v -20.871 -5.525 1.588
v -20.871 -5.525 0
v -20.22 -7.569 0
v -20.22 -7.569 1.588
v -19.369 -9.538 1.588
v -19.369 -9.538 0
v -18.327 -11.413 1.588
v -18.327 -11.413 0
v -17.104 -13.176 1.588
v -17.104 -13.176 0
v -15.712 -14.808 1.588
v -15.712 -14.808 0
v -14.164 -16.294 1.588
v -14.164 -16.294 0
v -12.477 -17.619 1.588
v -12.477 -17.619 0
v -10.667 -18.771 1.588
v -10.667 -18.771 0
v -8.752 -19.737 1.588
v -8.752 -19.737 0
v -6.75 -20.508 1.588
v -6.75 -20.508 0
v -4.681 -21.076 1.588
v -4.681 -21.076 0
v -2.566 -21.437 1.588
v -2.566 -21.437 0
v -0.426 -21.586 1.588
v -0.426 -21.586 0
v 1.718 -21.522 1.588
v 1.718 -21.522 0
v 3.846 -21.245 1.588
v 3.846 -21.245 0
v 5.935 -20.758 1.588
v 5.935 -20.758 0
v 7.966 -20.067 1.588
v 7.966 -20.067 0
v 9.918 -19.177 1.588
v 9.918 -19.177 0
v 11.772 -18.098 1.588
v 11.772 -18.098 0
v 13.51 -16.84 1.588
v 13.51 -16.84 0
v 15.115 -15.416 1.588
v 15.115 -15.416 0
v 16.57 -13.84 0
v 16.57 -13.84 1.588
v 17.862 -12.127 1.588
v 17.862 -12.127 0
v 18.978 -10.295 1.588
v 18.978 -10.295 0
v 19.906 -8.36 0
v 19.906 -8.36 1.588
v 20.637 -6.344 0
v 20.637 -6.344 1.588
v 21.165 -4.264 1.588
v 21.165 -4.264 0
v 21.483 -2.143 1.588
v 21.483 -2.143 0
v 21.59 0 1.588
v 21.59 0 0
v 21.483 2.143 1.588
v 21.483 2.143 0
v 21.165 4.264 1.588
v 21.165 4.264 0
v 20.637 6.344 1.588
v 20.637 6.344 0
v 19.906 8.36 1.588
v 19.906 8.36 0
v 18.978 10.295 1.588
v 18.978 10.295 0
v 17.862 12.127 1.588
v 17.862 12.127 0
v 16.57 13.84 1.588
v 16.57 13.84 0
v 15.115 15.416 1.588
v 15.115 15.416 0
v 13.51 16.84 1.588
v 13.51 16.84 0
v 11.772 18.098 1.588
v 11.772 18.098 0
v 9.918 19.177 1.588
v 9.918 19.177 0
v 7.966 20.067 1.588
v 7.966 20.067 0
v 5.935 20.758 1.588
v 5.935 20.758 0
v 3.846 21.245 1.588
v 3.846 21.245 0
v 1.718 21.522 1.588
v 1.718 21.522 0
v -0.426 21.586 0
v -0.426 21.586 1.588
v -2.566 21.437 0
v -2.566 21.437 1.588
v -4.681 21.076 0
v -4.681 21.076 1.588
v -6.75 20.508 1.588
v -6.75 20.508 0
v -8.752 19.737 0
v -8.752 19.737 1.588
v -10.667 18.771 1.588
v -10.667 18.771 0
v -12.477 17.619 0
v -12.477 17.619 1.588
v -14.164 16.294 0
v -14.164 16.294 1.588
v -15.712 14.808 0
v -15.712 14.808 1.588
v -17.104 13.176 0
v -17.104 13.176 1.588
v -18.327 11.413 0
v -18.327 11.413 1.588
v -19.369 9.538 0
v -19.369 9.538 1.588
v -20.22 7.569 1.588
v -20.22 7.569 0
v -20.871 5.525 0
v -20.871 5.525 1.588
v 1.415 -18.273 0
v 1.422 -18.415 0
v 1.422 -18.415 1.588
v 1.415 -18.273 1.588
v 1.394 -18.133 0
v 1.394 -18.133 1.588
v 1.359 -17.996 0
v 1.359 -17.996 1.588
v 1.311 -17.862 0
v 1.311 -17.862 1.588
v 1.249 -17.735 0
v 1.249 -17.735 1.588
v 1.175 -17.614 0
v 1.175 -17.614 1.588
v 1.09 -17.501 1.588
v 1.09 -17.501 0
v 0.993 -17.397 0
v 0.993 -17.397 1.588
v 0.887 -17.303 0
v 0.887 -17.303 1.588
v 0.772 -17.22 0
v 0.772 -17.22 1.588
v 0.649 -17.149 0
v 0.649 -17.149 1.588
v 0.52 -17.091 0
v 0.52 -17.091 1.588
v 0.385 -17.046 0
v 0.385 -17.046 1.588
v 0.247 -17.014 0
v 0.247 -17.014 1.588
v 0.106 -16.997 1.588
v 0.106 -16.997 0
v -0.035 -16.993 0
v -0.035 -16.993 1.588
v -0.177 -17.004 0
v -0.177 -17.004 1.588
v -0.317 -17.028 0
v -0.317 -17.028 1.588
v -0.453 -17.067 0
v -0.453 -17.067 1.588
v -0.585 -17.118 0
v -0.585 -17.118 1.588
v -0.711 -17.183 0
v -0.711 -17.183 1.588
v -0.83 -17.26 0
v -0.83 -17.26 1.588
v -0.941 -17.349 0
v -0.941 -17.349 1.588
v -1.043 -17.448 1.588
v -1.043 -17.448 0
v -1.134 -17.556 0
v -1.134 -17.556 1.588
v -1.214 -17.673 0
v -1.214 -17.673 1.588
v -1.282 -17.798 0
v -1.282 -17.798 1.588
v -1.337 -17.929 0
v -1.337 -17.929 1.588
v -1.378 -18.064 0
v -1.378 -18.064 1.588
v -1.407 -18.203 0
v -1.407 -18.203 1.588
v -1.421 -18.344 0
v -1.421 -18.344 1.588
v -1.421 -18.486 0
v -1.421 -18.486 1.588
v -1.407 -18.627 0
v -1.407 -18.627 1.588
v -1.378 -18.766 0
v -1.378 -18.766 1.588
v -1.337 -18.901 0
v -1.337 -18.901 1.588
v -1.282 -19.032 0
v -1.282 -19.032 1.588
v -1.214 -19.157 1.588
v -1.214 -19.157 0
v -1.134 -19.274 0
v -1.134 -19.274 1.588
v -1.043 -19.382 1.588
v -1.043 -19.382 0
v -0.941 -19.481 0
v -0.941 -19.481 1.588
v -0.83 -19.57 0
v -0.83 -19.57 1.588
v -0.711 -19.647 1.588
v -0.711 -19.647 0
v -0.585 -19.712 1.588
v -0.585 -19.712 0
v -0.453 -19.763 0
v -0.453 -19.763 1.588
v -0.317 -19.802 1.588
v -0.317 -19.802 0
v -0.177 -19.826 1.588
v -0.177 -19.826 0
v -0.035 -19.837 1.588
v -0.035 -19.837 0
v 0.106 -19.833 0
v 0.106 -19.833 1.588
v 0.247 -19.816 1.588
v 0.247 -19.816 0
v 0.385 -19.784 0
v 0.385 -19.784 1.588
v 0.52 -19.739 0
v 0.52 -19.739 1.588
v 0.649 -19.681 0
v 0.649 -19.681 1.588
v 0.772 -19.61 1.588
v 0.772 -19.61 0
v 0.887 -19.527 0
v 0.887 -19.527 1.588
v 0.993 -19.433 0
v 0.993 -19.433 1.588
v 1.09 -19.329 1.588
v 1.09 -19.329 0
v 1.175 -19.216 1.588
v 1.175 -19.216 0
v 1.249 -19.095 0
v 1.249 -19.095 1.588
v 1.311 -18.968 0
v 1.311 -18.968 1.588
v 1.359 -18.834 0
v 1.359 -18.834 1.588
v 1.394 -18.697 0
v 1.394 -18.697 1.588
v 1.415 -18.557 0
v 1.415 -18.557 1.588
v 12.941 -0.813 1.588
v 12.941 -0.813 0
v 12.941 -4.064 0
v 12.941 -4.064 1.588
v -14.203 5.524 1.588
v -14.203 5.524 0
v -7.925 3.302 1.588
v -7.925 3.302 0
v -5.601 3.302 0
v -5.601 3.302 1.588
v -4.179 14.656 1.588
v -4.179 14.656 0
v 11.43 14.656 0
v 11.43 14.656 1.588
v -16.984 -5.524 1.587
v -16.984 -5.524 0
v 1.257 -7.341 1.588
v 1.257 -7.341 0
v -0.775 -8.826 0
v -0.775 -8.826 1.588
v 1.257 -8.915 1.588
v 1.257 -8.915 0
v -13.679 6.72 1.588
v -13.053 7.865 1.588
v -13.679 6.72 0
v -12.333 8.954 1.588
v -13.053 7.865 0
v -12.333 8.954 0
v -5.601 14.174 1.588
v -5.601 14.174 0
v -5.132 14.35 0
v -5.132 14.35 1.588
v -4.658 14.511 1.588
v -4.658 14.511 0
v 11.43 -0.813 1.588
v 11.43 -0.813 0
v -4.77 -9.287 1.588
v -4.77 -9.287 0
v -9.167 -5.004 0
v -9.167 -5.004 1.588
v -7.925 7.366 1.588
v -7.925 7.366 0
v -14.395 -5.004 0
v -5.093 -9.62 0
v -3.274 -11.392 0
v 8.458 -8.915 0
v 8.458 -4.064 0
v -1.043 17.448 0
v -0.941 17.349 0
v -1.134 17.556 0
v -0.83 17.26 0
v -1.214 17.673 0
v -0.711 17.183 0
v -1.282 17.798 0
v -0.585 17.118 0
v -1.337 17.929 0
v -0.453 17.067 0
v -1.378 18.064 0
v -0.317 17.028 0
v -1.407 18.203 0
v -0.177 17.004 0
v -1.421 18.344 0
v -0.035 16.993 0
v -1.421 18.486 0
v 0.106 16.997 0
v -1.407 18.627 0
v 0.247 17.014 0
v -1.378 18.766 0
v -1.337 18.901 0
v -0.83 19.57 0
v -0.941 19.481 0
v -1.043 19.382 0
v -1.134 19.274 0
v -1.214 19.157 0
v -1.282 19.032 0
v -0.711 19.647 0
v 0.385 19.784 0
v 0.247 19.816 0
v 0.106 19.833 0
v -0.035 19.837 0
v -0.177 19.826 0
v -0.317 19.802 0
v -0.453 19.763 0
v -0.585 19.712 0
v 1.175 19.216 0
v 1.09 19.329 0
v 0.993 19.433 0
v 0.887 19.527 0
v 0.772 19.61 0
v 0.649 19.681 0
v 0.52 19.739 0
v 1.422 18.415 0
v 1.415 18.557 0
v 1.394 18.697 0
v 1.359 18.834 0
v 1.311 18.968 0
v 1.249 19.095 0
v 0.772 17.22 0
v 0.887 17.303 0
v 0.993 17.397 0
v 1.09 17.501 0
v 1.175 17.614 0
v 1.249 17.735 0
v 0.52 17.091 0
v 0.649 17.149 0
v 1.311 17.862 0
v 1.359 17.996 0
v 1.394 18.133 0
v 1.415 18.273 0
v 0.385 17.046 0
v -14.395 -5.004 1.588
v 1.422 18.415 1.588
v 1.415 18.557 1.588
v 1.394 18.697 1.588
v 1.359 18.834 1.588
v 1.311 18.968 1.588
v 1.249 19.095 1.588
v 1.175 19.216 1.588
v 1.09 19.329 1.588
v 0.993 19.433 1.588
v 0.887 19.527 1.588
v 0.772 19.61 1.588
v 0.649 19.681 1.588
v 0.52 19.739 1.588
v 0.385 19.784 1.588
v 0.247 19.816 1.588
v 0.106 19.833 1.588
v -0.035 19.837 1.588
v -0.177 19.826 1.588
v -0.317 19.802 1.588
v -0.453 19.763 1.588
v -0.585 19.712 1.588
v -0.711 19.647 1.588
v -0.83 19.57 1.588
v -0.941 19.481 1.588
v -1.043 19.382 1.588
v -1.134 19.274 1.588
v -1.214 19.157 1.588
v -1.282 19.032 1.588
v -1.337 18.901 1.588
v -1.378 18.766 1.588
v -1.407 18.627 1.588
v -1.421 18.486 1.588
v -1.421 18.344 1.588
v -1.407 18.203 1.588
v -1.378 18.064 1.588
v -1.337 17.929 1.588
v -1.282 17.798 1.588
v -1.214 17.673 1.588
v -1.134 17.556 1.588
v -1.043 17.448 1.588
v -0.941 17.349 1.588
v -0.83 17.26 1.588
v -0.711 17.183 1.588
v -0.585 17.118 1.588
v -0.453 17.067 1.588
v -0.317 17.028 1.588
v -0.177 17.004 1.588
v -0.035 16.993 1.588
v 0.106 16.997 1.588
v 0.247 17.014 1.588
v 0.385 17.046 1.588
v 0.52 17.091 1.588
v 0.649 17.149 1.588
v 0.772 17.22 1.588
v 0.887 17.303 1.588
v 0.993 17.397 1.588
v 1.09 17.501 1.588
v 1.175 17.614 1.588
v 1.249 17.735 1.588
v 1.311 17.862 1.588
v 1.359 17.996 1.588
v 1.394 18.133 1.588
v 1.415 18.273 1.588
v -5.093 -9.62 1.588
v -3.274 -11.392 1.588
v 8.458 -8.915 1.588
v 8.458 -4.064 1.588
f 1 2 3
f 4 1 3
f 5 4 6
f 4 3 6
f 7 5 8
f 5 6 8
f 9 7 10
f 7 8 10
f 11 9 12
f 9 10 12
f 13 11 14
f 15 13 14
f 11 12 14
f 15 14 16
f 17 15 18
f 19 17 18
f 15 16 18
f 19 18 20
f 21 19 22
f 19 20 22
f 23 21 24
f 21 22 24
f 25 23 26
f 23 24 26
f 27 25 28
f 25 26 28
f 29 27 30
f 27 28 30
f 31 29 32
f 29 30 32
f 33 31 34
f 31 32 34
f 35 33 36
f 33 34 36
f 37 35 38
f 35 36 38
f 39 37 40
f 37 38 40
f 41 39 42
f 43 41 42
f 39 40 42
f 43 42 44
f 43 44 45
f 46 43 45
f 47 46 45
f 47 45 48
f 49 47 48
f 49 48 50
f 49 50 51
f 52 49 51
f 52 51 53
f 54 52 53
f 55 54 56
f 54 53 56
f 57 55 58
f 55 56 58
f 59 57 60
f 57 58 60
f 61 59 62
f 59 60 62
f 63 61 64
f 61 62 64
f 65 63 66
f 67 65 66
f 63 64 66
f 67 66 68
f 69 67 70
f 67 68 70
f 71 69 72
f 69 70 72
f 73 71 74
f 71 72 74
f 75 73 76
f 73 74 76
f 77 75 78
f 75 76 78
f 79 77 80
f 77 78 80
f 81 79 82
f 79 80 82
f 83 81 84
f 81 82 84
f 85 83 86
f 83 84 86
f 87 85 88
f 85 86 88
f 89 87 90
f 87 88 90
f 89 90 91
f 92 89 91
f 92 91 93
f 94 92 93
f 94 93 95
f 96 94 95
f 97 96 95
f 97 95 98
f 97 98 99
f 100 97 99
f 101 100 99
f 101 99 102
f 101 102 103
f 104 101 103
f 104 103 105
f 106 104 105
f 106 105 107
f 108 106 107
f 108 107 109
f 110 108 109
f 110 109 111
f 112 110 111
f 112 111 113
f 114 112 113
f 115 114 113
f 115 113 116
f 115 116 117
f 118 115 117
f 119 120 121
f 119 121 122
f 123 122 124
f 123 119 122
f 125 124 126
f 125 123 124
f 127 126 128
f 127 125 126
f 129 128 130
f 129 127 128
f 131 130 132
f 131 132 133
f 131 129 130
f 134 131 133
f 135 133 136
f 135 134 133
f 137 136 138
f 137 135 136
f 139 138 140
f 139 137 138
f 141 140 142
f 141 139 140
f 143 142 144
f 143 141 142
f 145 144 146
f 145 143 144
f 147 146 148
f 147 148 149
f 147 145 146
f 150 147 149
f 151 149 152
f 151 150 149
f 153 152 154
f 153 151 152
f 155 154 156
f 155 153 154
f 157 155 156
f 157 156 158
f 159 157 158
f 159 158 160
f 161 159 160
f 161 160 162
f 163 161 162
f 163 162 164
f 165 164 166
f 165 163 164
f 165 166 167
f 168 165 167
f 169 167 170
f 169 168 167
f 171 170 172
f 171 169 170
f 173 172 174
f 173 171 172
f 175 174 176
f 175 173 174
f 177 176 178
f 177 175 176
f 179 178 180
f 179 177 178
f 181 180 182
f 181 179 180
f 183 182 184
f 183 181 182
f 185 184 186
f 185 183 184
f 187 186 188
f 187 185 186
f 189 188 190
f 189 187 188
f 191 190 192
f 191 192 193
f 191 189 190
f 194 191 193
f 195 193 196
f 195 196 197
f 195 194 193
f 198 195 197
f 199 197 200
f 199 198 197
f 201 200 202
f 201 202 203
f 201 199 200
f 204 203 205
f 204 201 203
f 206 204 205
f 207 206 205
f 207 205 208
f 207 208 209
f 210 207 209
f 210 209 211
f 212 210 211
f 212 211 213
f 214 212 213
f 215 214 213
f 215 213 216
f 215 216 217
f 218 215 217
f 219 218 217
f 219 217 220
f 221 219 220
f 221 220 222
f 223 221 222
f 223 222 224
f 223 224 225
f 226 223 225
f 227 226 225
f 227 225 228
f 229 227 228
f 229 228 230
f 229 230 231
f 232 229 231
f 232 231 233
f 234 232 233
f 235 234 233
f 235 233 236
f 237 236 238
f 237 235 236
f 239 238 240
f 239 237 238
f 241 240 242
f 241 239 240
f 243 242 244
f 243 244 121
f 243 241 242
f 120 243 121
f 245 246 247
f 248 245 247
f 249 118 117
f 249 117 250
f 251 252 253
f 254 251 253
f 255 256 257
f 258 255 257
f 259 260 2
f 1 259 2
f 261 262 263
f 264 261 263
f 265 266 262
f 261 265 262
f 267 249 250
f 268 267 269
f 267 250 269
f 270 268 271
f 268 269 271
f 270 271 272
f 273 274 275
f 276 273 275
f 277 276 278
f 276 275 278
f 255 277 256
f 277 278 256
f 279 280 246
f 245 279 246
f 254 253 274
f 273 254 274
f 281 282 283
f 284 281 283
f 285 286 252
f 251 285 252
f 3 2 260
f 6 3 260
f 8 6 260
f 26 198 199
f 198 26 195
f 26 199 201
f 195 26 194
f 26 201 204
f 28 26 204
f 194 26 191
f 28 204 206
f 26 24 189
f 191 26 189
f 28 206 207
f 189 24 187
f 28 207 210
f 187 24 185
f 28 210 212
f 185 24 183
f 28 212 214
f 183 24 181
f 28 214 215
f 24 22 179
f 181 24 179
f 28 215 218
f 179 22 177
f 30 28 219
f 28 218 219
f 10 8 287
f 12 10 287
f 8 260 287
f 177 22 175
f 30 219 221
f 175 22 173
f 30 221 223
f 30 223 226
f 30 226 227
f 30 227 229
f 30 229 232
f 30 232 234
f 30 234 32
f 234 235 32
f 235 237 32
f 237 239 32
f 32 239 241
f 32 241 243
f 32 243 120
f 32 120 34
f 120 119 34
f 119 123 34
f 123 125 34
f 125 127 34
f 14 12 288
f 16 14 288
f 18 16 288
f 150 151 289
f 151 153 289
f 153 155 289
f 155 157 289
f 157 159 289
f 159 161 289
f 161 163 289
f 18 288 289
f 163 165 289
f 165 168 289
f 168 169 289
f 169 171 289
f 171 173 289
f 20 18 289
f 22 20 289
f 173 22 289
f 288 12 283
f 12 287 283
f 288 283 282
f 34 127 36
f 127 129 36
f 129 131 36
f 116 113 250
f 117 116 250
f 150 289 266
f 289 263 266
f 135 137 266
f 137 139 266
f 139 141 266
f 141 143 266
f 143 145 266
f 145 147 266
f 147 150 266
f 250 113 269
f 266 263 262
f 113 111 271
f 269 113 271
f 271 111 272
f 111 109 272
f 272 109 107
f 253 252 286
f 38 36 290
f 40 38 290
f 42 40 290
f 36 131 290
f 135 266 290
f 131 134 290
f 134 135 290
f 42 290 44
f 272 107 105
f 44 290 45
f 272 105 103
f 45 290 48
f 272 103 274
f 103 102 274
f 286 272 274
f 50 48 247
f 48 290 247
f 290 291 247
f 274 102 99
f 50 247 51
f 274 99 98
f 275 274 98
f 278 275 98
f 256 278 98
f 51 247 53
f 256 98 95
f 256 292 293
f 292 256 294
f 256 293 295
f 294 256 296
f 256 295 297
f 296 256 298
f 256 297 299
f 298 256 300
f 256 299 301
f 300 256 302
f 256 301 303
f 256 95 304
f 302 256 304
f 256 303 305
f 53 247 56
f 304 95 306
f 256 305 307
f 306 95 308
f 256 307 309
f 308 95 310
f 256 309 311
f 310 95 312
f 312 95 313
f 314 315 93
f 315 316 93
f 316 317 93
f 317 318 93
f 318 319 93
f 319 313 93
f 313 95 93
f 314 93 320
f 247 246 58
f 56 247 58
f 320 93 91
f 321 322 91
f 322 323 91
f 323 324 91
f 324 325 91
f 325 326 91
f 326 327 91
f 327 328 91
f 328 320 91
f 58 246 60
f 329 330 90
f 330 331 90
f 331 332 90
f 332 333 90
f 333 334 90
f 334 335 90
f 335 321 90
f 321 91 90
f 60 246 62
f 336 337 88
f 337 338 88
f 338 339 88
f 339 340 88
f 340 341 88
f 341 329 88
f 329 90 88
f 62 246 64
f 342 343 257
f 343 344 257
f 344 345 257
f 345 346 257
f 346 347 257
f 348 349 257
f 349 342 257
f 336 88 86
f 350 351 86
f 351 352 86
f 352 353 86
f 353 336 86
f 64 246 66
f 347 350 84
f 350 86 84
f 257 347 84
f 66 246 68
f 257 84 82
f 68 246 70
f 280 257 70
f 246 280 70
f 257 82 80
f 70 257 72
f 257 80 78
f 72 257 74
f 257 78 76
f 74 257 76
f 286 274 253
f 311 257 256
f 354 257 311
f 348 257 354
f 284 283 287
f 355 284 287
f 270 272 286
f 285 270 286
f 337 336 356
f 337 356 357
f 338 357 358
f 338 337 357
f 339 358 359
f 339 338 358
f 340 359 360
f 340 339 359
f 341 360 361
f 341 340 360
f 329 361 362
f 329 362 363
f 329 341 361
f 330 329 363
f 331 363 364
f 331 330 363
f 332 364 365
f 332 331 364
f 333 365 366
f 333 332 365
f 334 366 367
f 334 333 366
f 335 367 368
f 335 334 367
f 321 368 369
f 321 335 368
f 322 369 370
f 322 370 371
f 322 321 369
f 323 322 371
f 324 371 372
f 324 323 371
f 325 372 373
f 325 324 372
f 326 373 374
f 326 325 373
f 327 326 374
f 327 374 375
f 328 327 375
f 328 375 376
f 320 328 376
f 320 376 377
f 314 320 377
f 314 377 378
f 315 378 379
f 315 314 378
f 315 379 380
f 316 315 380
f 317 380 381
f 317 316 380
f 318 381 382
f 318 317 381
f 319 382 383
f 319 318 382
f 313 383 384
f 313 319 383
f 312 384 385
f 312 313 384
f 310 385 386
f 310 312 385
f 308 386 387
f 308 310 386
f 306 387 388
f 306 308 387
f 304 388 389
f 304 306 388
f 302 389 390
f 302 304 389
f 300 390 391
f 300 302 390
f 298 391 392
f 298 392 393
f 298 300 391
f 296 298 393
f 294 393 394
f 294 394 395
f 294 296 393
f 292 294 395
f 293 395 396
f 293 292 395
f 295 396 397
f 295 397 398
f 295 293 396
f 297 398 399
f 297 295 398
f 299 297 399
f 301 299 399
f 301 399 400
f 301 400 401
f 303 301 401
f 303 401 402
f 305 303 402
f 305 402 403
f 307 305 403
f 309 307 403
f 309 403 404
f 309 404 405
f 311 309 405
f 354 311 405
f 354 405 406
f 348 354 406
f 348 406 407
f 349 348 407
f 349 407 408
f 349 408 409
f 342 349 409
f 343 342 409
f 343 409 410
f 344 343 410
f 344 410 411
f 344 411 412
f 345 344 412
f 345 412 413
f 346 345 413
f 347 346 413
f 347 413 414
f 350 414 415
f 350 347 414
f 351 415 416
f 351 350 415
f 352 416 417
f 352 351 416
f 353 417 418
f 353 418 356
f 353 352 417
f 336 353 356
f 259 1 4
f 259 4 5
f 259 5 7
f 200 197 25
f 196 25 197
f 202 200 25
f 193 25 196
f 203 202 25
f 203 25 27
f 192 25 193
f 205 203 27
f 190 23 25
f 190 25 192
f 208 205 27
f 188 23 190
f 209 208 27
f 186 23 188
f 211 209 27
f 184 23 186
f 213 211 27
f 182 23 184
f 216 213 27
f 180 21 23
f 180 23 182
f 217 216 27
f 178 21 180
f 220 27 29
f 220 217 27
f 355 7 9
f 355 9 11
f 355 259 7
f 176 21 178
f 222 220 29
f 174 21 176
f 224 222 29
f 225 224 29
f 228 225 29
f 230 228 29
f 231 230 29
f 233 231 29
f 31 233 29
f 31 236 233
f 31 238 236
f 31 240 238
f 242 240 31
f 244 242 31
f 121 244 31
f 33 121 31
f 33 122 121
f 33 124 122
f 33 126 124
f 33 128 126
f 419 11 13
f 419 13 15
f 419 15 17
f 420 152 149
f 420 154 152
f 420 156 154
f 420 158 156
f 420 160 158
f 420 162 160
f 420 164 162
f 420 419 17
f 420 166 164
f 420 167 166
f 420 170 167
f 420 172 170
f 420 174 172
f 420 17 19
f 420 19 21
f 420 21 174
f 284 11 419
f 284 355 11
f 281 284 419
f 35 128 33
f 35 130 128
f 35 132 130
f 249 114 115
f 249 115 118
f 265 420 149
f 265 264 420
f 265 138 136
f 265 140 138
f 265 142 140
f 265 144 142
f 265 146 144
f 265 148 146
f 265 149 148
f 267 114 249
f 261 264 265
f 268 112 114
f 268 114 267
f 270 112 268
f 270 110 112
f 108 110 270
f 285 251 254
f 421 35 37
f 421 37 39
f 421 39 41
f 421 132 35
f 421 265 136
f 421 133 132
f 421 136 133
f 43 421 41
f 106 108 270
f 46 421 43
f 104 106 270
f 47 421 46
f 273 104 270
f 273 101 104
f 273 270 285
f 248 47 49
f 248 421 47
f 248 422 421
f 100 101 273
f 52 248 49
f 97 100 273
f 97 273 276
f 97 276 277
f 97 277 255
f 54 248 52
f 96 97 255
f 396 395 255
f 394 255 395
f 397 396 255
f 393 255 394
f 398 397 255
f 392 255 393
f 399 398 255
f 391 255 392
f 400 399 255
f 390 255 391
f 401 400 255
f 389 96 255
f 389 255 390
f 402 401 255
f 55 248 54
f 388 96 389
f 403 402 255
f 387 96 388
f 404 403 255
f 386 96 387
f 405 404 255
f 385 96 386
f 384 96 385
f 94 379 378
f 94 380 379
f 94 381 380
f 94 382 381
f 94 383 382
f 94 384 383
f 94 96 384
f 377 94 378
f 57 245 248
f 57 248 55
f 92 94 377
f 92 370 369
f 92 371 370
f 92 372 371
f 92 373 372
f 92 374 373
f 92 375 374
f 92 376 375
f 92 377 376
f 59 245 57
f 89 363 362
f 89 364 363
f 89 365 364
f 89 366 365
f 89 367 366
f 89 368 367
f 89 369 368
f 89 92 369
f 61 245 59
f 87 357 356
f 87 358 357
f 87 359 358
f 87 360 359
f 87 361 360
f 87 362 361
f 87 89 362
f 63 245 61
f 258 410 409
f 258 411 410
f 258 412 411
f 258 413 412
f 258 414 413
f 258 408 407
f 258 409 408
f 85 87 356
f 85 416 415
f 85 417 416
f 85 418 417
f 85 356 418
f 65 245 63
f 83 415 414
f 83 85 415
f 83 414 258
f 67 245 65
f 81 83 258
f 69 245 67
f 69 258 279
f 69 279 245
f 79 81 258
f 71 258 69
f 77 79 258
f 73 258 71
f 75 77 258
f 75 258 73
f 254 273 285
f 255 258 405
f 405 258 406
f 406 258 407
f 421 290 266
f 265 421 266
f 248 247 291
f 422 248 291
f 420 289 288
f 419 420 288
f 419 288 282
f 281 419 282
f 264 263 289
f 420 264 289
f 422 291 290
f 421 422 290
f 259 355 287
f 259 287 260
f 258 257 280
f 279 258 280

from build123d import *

# Parameters (mm, degrees)
SKETCH1_R           = 1.4224
BOSS_EXTRUDE1_DEPTH = 1.5875
CUT_EXTRUDE1_DEPTH  = 31.574112518


with BuildPart() as part:
    # Sketch1 → Boss-Extrude1 (new body)
    with BuildSketch(Plane.XY):
        with BuildLine():
            Line((-14.952058744, -2.948480848), (-16.984058744, -2.948480848))
            Line((-16.984058744, -2.948480848), (-16.984058744, -5.5245))
            Line((-16.984058744, -5.5245), (-20.871224203, -5.5245))
            ThreePointArc((-20.871224203, -5.5245), (21.59, 0), (-20.871224203, 5.5245))
            Line((-20.871224203, 5.5245), (-16.984058744, 5.5245))
            Line((-16.984058744, 5.5245), (-16.984058744, 2.948480848))
            Line((-16.984058744, 2.948480848), (-14.952058744, 2.948480848))
            ThreePointArc((-14.952058744, 2.948480848), (-13.968818521, 6.093415226), (-12.332576282, 8.9535))
            Line((-12.332576282, 8.9535), (-7.9248, 7.366))
            Line((-7.9248, 7.366), (-7.9248, 3.302))
            Line((-7.9248, 3.302), (-5.6007, 3.302))
            Line((-5.6007, 3.302), (-5.6007, 14.173558463))
            ThreePointArc((-5.6007, 14.173558463), (-4.895856129, 14.43219293), (-4.179129857, 14.6558))
            Line((-4.179129857, 14.6558), (4.179129857, 14.6558))
            Line((4.179129857, 14.6558), (11.43, 14.6558))
            Line((11.43, 14.6558), (11.43, -0.8128))
            Line((11.43, -0.8128), (12.9413, -0.8128))
            Line((12.9413, -0.8128), (12.9413, -4.064))
            Line((12.9413, -4.064), (8.4582, -4.064))
            Line((8.4582, -4.064), (8.4582, -8.9154))
            Line((8.4582, -8.9154), (1.2573, -8.9154))
            Line((1.2573, -8.9154), (1.2573, -7.3406))
            Line((1.2573, -7.3406), (-0.7747, -8.8265))
            Line((-0.7747, -8.8265), (-3.273729572, -11.3919))
            Line((-3.273729572, -11.3919), (-5.093162196, -9.619538602))
            Line((-5.093162196, -9.619538602), (-4.769706241, -9.287492148))
            Line((-4.769706241, -9.287492148), (-9.167166743, -5.0038))
            Line((-9.167166743, -5.0038), (-14.395123673, -5.0038))
            ThreePointArc((-14.395123673, -5.0038), (-14.709533071, -3.985879682), (-14.952058744, -2.948480848))
        make_face()
        with Locations((0, 18.415)):
            Circle(SKETCH1_R, mode=Mode.SUBTRACT)
        with Locations((0, -18.415)):
            Circle(SKETCH1_R, mode=Mode.SUBTRACT)
    extrude(amount=BOSS_EXTRUDE1_DEPTH)

    # Sketch2 → Cut-Extrude1 (cut, through all)
    with BuildSketch(Plane.XY.offset(1.5875)):
        Polygon((-14.395123673, -5.0038), (-16.984058744, -5.5245), (-16.984058744, 5.5245), (-14.203432675, 5.5245), align=None)
    extrude(amount=-CUT_EXTRUDE1_DEPTH, mode=Mode.SUBTRACT)


solid = part.part
